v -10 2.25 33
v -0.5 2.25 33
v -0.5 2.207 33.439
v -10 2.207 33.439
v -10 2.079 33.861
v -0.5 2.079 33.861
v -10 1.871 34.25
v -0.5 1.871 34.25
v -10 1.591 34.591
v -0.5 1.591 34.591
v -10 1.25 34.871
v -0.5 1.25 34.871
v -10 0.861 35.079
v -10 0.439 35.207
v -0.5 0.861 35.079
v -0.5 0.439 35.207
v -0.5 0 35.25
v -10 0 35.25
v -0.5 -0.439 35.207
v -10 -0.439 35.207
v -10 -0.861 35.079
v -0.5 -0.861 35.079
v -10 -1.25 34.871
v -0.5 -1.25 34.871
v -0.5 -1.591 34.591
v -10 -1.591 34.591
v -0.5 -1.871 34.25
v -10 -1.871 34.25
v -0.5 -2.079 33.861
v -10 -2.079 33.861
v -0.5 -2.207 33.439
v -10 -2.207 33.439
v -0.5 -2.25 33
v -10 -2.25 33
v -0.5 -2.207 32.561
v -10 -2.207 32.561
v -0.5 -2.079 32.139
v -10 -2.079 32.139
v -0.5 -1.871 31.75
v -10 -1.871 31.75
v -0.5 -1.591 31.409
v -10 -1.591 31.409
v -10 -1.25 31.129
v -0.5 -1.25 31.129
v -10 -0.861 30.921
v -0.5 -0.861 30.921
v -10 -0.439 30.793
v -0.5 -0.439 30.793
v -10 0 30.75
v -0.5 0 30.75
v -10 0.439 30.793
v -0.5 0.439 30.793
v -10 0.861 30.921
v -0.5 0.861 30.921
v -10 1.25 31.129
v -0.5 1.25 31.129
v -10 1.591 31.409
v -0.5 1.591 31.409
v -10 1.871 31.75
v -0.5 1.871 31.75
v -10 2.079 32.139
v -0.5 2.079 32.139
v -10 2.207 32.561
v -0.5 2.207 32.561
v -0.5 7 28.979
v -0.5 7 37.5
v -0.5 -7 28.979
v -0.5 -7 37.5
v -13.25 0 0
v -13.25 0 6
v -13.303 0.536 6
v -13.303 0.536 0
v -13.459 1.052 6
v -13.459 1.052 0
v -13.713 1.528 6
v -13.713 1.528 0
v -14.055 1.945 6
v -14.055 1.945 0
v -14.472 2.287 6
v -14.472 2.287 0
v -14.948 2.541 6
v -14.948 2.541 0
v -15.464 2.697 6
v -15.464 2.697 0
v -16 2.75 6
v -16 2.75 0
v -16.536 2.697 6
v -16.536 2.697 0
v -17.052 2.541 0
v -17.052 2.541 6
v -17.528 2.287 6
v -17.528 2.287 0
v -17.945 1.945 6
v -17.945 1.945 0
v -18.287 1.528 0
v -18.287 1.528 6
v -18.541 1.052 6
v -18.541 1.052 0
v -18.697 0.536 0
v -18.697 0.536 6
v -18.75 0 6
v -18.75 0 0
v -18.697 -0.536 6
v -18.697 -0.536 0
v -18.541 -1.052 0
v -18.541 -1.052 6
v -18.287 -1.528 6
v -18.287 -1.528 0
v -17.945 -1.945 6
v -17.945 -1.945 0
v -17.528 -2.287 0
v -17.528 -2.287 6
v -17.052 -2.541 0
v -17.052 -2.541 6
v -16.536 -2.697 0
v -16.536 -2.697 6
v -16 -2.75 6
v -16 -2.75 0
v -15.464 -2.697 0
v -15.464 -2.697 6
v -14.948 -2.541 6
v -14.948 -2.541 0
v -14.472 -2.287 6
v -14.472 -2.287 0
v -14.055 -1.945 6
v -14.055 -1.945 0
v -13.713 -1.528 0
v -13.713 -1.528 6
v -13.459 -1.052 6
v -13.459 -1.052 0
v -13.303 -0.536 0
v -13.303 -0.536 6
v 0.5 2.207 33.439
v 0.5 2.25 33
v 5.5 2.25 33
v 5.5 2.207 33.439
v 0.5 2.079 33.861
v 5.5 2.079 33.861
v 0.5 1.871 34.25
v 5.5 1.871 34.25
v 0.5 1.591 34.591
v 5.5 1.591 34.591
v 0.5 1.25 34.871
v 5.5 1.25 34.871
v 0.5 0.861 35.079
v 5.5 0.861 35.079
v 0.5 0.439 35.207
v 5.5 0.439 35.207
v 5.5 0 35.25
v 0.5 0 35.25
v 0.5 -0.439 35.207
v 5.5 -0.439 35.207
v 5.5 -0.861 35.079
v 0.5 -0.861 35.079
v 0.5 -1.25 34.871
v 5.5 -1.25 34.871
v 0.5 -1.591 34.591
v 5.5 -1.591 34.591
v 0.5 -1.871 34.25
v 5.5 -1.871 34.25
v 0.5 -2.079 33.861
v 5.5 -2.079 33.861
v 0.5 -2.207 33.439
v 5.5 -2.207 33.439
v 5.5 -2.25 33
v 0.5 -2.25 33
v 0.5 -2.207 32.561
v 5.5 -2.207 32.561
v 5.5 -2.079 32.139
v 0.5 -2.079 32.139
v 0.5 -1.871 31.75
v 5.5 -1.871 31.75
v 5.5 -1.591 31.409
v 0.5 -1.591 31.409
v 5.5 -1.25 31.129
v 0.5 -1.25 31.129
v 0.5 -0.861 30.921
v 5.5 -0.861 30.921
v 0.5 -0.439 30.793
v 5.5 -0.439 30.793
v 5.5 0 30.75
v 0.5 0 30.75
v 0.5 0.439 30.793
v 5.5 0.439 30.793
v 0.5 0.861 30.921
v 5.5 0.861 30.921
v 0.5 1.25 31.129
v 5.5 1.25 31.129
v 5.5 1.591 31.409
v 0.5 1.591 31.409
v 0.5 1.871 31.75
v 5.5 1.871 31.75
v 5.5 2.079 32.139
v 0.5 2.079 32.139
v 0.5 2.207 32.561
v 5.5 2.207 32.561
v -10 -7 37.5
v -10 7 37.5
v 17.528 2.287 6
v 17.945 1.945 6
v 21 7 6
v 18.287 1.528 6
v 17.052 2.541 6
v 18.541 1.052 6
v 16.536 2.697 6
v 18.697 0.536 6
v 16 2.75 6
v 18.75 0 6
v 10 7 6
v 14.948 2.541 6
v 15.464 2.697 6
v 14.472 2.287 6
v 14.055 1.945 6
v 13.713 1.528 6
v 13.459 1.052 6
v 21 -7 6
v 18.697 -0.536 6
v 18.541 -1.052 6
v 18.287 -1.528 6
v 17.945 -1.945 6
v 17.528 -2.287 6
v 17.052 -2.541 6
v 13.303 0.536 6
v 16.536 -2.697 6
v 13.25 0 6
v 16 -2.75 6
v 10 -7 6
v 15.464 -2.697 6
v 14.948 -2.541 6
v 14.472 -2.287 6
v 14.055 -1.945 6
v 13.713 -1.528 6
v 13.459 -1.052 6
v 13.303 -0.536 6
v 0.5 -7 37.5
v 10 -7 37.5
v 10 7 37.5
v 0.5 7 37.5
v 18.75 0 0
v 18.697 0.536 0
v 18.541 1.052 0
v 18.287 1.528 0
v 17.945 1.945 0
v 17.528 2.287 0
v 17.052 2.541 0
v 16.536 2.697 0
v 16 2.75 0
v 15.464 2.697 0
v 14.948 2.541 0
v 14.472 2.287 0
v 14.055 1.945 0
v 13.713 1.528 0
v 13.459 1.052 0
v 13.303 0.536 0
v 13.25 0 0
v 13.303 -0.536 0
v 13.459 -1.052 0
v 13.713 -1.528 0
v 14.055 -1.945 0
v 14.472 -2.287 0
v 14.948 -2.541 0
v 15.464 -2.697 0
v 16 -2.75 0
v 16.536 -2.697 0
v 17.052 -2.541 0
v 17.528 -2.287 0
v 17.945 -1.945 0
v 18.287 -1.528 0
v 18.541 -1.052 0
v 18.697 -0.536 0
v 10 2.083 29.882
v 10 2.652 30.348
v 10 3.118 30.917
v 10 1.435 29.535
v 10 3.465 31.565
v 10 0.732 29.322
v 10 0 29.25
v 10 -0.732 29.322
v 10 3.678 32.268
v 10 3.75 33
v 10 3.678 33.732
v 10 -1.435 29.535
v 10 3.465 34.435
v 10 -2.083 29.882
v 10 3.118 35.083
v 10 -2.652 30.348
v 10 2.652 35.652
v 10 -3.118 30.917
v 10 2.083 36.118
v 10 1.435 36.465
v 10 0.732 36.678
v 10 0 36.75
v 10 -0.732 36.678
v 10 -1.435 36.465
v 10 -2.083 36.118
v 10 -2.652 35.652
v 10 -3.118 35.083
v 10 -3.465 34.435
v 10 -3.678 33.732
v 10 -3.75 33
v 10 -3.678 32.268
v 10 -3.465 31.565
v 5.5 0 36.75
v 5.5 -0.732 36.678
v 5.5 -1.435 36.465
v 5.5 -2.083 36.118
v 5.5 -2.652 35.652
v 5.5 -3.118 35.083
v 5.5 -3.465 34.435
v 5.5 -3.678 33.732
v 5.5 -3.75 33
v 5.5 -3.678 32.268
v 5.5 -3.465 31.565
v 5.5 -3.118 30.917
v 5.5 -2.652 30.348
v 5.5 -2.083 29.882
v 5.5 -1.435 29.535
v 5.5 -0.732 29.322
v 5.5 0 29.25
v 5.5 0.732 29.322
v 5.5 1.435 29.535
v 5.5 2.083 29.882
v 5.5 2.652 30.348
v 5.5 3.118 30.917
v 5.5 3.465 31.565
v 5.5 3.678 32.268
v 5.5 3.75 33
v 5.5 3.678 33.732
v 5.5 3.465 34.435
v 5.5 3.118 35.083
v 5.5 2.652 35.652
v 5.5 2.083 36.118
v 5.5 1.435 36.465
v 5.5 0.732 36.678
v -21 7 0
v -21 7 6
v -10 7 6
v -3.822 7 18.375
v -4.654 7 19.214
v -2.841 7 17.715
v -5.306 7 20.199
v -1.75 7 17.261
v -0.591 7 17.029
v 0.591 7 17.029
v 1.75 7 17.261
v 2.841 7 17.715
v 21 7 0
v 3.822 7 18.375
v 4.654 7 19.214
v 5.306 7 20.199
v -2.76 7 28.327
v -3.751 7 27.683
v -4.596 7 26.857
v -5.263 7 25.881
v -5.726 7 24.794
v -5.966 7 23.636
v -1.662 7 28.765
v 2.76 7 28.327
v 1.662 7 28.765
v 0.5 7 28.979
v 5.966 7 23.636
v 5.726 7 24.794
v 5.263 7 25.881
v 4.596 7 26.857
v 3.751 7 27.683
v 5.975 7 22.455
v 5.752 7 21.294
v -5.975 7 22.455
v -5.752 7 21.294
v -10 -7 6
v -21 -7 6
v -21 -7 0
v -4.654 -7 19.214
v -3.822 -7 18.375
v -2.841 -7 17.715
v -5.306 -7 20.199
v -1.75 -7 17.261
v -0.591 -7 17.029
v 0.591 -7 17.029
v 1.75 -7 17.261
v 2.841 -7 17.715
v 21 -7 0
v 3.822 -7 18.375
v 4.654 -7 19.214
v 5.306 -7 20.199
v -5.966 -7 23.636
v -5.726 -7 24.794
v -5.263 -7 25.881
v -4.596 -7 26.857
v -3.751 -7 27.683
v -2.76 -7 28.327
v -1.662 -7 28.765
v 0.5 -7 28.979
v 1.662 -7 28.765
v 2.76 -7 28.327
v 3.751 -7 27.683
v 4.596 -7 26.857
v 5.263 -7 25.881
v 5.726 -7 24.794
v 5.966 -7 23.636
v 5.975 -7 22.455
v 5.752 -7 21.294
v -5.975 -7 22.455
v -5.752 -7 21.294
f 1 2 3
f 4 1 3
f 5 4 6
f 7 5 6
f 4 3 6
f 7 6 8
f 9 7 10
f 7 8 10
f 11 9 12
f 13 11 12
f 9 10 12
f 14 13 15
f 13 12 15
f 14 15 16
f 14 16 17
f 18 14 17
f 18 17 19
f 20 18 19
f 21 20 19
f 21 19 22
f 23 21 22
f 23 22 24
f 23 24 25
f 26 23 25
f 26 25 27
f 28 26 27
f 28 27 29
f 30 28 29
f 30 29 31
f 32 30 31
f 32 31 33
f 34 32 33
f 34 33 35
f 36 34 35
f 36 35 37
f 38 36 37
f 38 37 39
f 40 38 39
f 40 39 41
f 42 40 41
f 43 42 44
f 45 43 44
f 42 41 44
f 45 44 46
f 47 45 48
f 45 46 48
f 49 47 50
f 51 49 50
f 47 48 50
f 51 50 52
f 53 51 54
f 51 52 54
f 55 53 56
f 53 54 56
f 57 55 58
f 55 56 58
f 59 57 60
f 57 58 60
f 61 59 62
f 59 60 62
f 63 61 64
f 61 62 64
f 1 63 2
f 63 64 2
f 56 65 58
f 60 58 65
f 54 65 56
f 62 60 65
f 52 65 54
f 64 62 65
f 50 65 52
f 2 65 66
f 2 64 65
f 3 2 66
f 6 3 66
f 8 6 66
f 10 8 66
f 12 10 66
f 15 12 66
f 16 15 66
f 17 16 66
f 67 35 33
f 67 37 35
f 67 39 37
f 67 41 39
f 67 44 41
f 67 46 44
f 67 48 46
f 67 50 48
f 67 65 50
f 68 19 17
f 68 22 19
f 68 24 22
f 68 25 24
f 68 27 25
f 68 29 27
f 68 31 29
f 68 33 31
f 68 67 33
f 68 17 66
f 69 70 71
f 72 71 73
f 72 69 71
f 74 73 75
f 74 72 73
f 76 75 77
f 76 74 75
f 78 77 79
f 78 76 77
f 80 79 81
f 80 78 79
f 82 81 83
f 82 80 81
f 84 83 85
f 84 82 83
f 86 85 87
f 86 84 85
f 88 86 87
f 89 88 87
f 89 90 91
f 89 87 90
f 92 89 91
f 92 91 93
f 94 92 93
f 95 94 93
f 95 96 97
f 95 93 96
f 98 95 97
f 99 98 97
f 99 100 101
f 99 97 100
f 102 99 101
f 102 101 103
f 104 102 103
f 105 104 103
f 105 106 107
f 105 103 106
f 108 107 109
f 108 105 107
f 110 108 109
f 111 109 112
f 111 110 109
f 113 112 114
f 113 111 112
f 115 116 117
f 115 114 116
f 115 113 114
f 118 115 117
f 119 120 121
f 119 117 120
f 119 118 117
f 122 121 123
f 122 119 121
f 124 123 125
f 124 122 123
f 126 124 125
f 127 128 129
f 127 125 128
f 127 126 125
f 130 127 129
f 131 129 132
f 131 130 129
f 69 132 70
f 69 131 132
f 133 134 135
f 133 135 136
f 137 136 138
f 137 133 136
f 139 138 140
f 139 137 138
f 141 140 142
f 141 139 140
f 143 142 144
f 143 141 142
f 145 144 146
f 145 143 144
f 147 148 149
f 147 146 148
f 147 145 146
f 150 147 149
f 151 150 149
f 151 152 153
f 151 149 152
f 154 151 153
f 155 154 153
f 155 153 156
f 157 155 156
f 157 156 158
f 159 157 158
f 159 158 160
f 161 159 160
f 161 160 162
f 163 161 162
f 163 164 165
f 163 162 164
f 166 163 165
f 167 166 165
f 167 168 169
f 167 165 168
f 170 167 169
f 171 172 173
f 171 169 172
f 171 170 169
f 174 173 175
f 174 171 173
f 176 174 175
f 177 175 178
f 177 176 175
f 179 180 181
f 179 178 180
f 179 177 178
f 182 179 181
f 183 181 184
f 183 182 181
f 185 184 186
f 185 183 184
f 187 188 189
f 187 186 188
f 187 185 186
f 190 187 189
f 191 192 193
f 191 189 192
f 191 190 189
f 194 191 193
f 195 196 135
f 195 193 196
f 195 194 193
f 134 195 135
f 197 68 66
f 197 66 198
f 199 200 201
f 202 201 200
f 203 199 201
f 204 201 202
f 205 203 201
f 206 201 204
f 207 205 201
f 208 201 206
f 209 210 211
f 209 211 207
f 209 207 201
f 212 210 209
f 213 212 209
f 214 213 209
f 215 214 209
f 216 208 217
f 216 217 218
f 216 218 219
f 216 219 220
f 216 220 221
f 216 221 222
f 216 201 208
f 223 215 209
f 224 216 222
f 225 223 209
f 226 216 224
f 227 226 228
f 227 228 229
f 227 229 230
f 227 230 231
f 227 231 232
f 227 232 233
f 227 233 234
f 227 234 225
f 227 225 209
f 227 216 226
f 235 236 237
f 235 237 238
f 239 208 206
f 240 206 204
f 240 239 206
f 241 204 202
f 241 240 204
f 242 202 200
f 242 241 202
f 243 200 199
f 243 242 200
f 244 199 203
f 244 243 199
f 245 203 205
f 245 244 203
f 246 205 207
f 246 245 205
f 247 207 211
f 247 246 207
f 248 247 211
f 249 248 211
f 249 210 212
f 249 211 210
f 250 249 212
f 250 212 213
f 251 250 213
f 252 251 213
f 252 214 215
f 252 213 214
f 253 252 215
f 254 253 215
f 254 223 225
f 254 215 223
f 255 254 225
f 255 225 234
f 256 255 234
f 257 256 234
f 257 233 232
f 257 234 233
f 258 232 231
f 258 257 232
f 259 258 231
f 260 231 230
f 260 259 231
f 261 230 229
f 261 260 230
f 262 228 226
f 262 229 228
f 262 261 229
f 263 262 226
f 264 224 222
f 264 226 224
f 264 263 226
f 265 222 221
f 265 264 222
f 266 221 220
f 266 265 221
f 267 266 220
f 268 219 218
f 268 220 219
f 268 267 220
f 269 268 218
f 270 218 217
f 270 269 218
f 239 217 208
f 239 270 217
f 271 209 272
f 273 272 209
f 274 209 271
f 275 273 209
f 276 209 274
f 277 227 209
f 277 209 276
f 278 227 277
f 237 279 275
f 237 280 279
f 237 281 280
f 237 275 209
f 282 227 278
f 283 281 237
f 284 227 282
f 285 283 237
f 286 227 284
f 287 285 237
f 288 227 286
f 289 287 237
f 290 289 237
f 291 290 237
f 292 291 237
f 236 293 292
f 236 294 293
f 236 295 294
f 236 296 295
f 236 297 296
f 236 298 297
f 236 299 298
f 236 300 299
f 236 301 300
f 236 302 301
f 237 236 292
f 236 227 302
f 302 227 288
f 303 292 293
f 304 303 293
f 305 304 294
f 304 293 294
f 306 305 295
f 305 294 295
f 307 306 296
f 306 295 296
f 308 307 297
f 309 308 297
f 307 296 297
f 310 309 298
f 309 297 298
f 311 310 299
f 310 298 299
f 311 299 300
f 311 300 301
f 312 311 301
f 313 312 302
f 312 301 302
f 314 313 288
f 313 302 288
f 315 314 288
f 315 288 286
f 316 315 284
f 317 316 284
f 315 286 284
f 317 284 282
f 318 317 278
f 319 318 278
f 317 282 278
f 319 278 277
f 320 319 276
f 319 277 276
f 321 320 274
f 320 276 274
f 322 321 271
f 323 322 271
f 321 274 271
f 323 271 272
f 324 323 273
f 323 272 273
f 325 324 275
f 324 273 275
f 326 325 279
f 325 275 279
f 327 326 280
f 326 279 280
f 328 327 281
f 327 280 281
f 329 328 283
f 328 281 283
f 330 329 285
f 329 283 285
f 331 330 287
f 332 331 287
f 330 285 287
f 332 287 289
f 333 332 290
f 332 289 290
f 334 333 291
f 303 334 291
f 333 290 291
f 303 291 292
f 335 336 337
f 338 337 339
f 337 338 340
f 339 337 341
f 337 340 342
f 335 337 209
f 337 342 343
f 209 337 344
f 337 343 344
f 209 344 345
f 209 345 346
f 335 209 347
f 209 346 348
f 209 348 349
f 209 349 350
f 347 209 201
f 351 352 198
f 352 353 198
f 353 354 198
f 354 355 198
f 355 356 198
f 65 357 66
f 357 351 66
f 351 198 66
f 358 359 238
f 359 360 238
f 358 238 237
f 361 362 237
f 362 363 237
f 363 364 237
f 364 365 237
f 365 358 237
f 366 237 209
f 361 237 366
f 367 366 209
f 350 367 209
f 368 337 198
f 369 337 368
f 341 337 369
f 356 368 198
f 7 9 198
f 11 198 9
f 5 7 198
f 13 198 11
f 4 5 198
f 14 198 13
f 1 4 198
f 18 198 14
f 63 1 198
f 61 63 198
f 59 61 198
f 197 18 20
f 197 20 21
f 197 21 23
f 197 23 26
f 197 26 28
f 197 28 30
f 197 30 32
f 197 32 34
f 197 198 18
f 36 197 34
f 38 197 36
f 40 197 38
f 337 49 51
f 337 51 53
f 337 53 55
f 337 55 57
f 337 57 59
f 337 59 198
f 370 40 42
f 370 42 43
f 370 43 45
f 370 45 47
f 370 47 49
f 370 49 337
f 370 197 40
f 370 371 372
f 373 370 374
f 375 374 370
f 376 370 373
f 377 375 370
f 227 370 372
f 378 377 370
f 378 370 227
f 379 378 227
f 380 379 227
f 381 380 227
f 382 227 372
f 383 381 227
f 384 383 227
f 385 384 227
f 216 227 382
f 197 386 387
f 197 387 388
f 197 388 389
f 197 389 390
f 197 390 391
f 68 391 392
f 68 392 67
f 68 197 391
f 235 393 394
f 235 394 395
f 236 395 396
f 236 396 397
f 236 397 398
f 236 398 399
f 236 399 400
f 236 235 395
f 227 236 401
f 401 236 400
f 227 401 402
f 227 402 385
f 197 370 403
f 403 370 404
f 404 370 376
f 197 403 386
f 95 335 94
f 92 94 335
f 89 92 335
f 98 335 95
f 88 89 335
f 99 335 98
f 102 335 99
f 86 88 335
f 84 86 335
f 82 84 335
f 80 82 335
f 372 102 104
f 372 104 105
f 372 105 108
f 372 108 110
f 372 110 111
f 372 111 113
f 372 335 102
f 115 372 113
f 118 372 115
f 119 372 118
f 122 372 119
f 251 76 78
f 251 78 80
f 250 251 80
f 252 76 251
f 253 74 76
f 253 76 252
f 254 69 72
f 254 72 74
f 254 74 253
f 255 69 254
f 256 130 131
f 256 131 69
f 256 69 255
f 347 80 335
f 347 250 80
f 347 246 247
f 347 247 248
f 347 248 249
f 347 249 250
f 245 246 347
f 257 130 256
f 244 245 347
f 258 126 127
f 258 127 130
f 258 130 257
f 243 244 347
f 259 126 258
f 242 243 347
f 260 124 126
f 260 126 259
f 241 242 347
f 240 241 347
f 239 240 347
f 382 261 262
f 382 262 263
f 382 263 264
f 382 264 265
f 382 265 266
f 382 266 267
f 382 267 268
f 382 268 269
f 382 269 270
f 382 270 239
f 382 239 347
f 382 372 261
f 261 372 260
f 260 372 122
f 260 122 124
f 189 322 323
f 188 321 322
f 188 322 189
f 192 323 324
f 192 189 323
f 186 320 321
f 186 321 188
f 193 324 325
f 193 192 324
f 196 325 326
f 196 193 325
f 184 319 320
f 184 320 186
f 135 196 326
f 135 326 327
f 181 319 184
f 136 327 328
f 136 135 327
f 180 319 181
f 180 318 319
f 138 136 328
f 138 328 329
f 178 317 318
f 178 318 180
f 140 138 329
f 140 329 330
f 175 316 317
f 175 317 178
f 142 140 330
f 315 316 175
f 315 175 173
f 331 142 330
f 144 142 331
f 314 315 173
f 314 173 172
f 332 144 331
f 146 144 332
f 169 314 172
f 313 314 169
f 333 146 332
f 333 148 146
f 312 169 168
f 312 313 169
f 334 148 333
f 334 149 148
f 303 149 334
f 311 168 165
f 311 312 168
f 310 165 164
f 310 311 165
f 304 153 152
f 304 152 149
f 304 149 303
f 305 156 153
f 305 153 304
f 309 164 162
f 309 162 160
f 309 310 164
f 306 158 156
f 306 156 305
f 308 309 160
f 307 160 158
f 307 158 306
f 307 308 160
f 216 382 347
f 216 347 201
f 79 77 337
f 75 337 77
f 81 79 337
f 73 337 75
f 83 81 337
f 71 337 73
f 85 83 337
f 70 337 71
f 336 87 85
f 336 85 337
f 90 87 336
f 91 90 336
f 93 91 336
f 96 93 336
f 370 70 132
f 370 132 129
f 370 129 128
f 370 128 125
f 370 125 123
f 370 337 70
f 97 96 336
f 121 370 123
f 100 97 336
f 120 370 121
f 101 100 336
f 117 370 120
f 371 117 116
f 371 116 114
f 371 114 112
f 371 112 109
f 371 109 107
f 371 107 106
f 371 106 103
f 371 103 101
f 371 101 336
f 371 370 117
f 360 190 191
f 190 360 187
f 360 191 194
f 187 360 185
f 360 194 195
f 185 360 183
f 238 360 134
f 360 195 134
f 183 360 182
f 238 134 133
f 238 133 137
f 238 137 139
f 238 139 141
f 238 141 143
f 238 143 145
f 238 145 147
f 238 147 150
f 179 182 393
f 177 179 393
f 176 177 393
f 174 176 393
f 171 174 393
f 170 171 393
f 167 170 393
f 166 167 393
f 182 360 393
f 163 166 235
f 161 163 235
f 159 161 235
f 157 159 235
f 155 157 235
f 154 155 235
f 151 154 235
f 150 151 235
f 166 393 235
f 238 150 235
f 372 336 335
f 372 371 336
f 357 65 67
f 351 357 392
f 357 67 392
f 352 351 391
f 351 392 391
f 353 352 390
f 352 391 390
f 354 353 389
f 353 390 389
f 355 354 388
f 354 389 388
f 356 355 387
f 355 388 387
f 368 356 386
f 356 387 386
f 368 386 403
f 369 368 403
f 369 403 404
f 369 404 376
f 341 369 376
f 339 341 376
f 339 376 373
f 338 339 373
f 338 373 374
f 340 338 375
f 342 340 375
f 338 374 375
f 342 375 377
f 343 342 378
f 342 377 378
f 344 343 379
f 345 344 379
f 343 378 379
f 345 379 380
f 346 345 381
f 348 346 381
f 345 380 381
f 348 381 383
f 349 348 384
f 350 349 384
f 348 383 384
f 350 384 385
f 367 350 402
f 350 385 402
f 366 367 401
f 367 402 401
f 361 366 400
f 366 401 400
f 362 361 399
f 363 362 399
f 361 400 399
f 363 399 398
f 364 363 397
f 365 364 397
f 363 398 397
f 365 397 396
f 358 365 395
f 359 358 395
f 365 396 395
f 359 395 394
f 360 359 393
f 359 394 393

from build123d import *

# Parameters (mm, degrees)
PAD_DEPTH            = 7
SKETCH001_W          = 1
SKETCH001_H          = 24.5
POCKET_DEPTH         = 7.001
POCKET_DEPTH_BACK    = -7.001
SKETCH002_R          = 6
POCKET001_DEPTH      = 7.001
POCKET001_DEPTH_BACK = -7.001
SKETCH003_R          = 2.75
POCKET002_DEPTH      = 0.001
POCKET002_DEPTH_BACK = -37.501
SKETCH004_R          = 2.25
POCKET003_DEPTH      = 21.001
POCKET003_DEPTH_BACK = -21.001
SKETCH005_R          = 3.75
POCKET004_DEPTH      = 4.5


with BuildPart() as part:
    # Sketch → Pad (new body, symmetric)
    with BuildSketch(Plane.XZ):
        Polygon((-21, 0), (21, 0), (21, 6), (10, 6), (10, 37.5), (-10, 37.5), (-10, 6), (-21, 6), align=None)
    extrude(amount=PAD_DEPTH, both=True)

    # Sketch001 → Pocket (cut, two sides)
    with BuildSketch(Plane.XZ) as pocket_sk:
        with Locations((0, 35.25)):
            Rectangle(SKETCH001_W, SKETCH001_H)
    extrude(amount=-POCKET_DEPTH, mode=Mode.SUBTRACT)
    extrude(pocket_sk.sketch, amount=-POCKET_DEPTH_BACK, mode=Mode.SUBTRACT)

    # Sketch002 → Pocket001 (cut, two sides)
    with BuildSketch(Plane.XZ) as pocket001_sk:
        with Locations((0, 23)):
            Circle(SKETCH002_R)
    extrude(amount=-POCKET001_DEPTH, mode=Mode.SUBTRACT)
    extrude(pocket001_sk.sketch, amount=-POCKET001_DEPTH_BACK, mode=Mode.SUBTRACT)

    # Sketch003 → Pocket002 (cut, two sides)
    with BuildSketch(Plane.XY) as pocket002_sk:
        with Locations((-16, 0)):
            Circle(SKETCH003_R)
        with Locations((16, 0)):
            Circle(SKETCH003_R)
    extrude(amount=-POCKET002_DEPTH, mode=Mode.SUBTRACT)
    extrude(pocket002_sk.sketch, amount=-POCKET002_DEPTH_BACK, mode=Mode.SUBTRACT)

    # Sketch004 → Pocket003 (cut, two sides)
    with BuildSketch(Plane.YZ) as pocket003_sk:
        with Locations((0, 33)):
            Circle(SKETCH004_R)
    extrude(amount=-POCKET003_DEPTH, mode=Mode.SUBTRACT)
    extrude(pocket003_sk.sketch, amount=-POCKET003_DEPTH_BACK, mode=Mode.SUBTRACT)

    # Sketch005 (on Face16 of Pocket003) → Pocket004 (cut)
    with BuildSketch(Plane(origin=(10, 0, 0), x_dir=(0, 0, 1), z_dir=(1, 0, 0))):
        with Locations((33, 0)):
            Circle(SKETCH005_R)
    extrude(amount=-POCKET004_DEPTH, mode=Mode.SUBTRACT)


solid = part.part
